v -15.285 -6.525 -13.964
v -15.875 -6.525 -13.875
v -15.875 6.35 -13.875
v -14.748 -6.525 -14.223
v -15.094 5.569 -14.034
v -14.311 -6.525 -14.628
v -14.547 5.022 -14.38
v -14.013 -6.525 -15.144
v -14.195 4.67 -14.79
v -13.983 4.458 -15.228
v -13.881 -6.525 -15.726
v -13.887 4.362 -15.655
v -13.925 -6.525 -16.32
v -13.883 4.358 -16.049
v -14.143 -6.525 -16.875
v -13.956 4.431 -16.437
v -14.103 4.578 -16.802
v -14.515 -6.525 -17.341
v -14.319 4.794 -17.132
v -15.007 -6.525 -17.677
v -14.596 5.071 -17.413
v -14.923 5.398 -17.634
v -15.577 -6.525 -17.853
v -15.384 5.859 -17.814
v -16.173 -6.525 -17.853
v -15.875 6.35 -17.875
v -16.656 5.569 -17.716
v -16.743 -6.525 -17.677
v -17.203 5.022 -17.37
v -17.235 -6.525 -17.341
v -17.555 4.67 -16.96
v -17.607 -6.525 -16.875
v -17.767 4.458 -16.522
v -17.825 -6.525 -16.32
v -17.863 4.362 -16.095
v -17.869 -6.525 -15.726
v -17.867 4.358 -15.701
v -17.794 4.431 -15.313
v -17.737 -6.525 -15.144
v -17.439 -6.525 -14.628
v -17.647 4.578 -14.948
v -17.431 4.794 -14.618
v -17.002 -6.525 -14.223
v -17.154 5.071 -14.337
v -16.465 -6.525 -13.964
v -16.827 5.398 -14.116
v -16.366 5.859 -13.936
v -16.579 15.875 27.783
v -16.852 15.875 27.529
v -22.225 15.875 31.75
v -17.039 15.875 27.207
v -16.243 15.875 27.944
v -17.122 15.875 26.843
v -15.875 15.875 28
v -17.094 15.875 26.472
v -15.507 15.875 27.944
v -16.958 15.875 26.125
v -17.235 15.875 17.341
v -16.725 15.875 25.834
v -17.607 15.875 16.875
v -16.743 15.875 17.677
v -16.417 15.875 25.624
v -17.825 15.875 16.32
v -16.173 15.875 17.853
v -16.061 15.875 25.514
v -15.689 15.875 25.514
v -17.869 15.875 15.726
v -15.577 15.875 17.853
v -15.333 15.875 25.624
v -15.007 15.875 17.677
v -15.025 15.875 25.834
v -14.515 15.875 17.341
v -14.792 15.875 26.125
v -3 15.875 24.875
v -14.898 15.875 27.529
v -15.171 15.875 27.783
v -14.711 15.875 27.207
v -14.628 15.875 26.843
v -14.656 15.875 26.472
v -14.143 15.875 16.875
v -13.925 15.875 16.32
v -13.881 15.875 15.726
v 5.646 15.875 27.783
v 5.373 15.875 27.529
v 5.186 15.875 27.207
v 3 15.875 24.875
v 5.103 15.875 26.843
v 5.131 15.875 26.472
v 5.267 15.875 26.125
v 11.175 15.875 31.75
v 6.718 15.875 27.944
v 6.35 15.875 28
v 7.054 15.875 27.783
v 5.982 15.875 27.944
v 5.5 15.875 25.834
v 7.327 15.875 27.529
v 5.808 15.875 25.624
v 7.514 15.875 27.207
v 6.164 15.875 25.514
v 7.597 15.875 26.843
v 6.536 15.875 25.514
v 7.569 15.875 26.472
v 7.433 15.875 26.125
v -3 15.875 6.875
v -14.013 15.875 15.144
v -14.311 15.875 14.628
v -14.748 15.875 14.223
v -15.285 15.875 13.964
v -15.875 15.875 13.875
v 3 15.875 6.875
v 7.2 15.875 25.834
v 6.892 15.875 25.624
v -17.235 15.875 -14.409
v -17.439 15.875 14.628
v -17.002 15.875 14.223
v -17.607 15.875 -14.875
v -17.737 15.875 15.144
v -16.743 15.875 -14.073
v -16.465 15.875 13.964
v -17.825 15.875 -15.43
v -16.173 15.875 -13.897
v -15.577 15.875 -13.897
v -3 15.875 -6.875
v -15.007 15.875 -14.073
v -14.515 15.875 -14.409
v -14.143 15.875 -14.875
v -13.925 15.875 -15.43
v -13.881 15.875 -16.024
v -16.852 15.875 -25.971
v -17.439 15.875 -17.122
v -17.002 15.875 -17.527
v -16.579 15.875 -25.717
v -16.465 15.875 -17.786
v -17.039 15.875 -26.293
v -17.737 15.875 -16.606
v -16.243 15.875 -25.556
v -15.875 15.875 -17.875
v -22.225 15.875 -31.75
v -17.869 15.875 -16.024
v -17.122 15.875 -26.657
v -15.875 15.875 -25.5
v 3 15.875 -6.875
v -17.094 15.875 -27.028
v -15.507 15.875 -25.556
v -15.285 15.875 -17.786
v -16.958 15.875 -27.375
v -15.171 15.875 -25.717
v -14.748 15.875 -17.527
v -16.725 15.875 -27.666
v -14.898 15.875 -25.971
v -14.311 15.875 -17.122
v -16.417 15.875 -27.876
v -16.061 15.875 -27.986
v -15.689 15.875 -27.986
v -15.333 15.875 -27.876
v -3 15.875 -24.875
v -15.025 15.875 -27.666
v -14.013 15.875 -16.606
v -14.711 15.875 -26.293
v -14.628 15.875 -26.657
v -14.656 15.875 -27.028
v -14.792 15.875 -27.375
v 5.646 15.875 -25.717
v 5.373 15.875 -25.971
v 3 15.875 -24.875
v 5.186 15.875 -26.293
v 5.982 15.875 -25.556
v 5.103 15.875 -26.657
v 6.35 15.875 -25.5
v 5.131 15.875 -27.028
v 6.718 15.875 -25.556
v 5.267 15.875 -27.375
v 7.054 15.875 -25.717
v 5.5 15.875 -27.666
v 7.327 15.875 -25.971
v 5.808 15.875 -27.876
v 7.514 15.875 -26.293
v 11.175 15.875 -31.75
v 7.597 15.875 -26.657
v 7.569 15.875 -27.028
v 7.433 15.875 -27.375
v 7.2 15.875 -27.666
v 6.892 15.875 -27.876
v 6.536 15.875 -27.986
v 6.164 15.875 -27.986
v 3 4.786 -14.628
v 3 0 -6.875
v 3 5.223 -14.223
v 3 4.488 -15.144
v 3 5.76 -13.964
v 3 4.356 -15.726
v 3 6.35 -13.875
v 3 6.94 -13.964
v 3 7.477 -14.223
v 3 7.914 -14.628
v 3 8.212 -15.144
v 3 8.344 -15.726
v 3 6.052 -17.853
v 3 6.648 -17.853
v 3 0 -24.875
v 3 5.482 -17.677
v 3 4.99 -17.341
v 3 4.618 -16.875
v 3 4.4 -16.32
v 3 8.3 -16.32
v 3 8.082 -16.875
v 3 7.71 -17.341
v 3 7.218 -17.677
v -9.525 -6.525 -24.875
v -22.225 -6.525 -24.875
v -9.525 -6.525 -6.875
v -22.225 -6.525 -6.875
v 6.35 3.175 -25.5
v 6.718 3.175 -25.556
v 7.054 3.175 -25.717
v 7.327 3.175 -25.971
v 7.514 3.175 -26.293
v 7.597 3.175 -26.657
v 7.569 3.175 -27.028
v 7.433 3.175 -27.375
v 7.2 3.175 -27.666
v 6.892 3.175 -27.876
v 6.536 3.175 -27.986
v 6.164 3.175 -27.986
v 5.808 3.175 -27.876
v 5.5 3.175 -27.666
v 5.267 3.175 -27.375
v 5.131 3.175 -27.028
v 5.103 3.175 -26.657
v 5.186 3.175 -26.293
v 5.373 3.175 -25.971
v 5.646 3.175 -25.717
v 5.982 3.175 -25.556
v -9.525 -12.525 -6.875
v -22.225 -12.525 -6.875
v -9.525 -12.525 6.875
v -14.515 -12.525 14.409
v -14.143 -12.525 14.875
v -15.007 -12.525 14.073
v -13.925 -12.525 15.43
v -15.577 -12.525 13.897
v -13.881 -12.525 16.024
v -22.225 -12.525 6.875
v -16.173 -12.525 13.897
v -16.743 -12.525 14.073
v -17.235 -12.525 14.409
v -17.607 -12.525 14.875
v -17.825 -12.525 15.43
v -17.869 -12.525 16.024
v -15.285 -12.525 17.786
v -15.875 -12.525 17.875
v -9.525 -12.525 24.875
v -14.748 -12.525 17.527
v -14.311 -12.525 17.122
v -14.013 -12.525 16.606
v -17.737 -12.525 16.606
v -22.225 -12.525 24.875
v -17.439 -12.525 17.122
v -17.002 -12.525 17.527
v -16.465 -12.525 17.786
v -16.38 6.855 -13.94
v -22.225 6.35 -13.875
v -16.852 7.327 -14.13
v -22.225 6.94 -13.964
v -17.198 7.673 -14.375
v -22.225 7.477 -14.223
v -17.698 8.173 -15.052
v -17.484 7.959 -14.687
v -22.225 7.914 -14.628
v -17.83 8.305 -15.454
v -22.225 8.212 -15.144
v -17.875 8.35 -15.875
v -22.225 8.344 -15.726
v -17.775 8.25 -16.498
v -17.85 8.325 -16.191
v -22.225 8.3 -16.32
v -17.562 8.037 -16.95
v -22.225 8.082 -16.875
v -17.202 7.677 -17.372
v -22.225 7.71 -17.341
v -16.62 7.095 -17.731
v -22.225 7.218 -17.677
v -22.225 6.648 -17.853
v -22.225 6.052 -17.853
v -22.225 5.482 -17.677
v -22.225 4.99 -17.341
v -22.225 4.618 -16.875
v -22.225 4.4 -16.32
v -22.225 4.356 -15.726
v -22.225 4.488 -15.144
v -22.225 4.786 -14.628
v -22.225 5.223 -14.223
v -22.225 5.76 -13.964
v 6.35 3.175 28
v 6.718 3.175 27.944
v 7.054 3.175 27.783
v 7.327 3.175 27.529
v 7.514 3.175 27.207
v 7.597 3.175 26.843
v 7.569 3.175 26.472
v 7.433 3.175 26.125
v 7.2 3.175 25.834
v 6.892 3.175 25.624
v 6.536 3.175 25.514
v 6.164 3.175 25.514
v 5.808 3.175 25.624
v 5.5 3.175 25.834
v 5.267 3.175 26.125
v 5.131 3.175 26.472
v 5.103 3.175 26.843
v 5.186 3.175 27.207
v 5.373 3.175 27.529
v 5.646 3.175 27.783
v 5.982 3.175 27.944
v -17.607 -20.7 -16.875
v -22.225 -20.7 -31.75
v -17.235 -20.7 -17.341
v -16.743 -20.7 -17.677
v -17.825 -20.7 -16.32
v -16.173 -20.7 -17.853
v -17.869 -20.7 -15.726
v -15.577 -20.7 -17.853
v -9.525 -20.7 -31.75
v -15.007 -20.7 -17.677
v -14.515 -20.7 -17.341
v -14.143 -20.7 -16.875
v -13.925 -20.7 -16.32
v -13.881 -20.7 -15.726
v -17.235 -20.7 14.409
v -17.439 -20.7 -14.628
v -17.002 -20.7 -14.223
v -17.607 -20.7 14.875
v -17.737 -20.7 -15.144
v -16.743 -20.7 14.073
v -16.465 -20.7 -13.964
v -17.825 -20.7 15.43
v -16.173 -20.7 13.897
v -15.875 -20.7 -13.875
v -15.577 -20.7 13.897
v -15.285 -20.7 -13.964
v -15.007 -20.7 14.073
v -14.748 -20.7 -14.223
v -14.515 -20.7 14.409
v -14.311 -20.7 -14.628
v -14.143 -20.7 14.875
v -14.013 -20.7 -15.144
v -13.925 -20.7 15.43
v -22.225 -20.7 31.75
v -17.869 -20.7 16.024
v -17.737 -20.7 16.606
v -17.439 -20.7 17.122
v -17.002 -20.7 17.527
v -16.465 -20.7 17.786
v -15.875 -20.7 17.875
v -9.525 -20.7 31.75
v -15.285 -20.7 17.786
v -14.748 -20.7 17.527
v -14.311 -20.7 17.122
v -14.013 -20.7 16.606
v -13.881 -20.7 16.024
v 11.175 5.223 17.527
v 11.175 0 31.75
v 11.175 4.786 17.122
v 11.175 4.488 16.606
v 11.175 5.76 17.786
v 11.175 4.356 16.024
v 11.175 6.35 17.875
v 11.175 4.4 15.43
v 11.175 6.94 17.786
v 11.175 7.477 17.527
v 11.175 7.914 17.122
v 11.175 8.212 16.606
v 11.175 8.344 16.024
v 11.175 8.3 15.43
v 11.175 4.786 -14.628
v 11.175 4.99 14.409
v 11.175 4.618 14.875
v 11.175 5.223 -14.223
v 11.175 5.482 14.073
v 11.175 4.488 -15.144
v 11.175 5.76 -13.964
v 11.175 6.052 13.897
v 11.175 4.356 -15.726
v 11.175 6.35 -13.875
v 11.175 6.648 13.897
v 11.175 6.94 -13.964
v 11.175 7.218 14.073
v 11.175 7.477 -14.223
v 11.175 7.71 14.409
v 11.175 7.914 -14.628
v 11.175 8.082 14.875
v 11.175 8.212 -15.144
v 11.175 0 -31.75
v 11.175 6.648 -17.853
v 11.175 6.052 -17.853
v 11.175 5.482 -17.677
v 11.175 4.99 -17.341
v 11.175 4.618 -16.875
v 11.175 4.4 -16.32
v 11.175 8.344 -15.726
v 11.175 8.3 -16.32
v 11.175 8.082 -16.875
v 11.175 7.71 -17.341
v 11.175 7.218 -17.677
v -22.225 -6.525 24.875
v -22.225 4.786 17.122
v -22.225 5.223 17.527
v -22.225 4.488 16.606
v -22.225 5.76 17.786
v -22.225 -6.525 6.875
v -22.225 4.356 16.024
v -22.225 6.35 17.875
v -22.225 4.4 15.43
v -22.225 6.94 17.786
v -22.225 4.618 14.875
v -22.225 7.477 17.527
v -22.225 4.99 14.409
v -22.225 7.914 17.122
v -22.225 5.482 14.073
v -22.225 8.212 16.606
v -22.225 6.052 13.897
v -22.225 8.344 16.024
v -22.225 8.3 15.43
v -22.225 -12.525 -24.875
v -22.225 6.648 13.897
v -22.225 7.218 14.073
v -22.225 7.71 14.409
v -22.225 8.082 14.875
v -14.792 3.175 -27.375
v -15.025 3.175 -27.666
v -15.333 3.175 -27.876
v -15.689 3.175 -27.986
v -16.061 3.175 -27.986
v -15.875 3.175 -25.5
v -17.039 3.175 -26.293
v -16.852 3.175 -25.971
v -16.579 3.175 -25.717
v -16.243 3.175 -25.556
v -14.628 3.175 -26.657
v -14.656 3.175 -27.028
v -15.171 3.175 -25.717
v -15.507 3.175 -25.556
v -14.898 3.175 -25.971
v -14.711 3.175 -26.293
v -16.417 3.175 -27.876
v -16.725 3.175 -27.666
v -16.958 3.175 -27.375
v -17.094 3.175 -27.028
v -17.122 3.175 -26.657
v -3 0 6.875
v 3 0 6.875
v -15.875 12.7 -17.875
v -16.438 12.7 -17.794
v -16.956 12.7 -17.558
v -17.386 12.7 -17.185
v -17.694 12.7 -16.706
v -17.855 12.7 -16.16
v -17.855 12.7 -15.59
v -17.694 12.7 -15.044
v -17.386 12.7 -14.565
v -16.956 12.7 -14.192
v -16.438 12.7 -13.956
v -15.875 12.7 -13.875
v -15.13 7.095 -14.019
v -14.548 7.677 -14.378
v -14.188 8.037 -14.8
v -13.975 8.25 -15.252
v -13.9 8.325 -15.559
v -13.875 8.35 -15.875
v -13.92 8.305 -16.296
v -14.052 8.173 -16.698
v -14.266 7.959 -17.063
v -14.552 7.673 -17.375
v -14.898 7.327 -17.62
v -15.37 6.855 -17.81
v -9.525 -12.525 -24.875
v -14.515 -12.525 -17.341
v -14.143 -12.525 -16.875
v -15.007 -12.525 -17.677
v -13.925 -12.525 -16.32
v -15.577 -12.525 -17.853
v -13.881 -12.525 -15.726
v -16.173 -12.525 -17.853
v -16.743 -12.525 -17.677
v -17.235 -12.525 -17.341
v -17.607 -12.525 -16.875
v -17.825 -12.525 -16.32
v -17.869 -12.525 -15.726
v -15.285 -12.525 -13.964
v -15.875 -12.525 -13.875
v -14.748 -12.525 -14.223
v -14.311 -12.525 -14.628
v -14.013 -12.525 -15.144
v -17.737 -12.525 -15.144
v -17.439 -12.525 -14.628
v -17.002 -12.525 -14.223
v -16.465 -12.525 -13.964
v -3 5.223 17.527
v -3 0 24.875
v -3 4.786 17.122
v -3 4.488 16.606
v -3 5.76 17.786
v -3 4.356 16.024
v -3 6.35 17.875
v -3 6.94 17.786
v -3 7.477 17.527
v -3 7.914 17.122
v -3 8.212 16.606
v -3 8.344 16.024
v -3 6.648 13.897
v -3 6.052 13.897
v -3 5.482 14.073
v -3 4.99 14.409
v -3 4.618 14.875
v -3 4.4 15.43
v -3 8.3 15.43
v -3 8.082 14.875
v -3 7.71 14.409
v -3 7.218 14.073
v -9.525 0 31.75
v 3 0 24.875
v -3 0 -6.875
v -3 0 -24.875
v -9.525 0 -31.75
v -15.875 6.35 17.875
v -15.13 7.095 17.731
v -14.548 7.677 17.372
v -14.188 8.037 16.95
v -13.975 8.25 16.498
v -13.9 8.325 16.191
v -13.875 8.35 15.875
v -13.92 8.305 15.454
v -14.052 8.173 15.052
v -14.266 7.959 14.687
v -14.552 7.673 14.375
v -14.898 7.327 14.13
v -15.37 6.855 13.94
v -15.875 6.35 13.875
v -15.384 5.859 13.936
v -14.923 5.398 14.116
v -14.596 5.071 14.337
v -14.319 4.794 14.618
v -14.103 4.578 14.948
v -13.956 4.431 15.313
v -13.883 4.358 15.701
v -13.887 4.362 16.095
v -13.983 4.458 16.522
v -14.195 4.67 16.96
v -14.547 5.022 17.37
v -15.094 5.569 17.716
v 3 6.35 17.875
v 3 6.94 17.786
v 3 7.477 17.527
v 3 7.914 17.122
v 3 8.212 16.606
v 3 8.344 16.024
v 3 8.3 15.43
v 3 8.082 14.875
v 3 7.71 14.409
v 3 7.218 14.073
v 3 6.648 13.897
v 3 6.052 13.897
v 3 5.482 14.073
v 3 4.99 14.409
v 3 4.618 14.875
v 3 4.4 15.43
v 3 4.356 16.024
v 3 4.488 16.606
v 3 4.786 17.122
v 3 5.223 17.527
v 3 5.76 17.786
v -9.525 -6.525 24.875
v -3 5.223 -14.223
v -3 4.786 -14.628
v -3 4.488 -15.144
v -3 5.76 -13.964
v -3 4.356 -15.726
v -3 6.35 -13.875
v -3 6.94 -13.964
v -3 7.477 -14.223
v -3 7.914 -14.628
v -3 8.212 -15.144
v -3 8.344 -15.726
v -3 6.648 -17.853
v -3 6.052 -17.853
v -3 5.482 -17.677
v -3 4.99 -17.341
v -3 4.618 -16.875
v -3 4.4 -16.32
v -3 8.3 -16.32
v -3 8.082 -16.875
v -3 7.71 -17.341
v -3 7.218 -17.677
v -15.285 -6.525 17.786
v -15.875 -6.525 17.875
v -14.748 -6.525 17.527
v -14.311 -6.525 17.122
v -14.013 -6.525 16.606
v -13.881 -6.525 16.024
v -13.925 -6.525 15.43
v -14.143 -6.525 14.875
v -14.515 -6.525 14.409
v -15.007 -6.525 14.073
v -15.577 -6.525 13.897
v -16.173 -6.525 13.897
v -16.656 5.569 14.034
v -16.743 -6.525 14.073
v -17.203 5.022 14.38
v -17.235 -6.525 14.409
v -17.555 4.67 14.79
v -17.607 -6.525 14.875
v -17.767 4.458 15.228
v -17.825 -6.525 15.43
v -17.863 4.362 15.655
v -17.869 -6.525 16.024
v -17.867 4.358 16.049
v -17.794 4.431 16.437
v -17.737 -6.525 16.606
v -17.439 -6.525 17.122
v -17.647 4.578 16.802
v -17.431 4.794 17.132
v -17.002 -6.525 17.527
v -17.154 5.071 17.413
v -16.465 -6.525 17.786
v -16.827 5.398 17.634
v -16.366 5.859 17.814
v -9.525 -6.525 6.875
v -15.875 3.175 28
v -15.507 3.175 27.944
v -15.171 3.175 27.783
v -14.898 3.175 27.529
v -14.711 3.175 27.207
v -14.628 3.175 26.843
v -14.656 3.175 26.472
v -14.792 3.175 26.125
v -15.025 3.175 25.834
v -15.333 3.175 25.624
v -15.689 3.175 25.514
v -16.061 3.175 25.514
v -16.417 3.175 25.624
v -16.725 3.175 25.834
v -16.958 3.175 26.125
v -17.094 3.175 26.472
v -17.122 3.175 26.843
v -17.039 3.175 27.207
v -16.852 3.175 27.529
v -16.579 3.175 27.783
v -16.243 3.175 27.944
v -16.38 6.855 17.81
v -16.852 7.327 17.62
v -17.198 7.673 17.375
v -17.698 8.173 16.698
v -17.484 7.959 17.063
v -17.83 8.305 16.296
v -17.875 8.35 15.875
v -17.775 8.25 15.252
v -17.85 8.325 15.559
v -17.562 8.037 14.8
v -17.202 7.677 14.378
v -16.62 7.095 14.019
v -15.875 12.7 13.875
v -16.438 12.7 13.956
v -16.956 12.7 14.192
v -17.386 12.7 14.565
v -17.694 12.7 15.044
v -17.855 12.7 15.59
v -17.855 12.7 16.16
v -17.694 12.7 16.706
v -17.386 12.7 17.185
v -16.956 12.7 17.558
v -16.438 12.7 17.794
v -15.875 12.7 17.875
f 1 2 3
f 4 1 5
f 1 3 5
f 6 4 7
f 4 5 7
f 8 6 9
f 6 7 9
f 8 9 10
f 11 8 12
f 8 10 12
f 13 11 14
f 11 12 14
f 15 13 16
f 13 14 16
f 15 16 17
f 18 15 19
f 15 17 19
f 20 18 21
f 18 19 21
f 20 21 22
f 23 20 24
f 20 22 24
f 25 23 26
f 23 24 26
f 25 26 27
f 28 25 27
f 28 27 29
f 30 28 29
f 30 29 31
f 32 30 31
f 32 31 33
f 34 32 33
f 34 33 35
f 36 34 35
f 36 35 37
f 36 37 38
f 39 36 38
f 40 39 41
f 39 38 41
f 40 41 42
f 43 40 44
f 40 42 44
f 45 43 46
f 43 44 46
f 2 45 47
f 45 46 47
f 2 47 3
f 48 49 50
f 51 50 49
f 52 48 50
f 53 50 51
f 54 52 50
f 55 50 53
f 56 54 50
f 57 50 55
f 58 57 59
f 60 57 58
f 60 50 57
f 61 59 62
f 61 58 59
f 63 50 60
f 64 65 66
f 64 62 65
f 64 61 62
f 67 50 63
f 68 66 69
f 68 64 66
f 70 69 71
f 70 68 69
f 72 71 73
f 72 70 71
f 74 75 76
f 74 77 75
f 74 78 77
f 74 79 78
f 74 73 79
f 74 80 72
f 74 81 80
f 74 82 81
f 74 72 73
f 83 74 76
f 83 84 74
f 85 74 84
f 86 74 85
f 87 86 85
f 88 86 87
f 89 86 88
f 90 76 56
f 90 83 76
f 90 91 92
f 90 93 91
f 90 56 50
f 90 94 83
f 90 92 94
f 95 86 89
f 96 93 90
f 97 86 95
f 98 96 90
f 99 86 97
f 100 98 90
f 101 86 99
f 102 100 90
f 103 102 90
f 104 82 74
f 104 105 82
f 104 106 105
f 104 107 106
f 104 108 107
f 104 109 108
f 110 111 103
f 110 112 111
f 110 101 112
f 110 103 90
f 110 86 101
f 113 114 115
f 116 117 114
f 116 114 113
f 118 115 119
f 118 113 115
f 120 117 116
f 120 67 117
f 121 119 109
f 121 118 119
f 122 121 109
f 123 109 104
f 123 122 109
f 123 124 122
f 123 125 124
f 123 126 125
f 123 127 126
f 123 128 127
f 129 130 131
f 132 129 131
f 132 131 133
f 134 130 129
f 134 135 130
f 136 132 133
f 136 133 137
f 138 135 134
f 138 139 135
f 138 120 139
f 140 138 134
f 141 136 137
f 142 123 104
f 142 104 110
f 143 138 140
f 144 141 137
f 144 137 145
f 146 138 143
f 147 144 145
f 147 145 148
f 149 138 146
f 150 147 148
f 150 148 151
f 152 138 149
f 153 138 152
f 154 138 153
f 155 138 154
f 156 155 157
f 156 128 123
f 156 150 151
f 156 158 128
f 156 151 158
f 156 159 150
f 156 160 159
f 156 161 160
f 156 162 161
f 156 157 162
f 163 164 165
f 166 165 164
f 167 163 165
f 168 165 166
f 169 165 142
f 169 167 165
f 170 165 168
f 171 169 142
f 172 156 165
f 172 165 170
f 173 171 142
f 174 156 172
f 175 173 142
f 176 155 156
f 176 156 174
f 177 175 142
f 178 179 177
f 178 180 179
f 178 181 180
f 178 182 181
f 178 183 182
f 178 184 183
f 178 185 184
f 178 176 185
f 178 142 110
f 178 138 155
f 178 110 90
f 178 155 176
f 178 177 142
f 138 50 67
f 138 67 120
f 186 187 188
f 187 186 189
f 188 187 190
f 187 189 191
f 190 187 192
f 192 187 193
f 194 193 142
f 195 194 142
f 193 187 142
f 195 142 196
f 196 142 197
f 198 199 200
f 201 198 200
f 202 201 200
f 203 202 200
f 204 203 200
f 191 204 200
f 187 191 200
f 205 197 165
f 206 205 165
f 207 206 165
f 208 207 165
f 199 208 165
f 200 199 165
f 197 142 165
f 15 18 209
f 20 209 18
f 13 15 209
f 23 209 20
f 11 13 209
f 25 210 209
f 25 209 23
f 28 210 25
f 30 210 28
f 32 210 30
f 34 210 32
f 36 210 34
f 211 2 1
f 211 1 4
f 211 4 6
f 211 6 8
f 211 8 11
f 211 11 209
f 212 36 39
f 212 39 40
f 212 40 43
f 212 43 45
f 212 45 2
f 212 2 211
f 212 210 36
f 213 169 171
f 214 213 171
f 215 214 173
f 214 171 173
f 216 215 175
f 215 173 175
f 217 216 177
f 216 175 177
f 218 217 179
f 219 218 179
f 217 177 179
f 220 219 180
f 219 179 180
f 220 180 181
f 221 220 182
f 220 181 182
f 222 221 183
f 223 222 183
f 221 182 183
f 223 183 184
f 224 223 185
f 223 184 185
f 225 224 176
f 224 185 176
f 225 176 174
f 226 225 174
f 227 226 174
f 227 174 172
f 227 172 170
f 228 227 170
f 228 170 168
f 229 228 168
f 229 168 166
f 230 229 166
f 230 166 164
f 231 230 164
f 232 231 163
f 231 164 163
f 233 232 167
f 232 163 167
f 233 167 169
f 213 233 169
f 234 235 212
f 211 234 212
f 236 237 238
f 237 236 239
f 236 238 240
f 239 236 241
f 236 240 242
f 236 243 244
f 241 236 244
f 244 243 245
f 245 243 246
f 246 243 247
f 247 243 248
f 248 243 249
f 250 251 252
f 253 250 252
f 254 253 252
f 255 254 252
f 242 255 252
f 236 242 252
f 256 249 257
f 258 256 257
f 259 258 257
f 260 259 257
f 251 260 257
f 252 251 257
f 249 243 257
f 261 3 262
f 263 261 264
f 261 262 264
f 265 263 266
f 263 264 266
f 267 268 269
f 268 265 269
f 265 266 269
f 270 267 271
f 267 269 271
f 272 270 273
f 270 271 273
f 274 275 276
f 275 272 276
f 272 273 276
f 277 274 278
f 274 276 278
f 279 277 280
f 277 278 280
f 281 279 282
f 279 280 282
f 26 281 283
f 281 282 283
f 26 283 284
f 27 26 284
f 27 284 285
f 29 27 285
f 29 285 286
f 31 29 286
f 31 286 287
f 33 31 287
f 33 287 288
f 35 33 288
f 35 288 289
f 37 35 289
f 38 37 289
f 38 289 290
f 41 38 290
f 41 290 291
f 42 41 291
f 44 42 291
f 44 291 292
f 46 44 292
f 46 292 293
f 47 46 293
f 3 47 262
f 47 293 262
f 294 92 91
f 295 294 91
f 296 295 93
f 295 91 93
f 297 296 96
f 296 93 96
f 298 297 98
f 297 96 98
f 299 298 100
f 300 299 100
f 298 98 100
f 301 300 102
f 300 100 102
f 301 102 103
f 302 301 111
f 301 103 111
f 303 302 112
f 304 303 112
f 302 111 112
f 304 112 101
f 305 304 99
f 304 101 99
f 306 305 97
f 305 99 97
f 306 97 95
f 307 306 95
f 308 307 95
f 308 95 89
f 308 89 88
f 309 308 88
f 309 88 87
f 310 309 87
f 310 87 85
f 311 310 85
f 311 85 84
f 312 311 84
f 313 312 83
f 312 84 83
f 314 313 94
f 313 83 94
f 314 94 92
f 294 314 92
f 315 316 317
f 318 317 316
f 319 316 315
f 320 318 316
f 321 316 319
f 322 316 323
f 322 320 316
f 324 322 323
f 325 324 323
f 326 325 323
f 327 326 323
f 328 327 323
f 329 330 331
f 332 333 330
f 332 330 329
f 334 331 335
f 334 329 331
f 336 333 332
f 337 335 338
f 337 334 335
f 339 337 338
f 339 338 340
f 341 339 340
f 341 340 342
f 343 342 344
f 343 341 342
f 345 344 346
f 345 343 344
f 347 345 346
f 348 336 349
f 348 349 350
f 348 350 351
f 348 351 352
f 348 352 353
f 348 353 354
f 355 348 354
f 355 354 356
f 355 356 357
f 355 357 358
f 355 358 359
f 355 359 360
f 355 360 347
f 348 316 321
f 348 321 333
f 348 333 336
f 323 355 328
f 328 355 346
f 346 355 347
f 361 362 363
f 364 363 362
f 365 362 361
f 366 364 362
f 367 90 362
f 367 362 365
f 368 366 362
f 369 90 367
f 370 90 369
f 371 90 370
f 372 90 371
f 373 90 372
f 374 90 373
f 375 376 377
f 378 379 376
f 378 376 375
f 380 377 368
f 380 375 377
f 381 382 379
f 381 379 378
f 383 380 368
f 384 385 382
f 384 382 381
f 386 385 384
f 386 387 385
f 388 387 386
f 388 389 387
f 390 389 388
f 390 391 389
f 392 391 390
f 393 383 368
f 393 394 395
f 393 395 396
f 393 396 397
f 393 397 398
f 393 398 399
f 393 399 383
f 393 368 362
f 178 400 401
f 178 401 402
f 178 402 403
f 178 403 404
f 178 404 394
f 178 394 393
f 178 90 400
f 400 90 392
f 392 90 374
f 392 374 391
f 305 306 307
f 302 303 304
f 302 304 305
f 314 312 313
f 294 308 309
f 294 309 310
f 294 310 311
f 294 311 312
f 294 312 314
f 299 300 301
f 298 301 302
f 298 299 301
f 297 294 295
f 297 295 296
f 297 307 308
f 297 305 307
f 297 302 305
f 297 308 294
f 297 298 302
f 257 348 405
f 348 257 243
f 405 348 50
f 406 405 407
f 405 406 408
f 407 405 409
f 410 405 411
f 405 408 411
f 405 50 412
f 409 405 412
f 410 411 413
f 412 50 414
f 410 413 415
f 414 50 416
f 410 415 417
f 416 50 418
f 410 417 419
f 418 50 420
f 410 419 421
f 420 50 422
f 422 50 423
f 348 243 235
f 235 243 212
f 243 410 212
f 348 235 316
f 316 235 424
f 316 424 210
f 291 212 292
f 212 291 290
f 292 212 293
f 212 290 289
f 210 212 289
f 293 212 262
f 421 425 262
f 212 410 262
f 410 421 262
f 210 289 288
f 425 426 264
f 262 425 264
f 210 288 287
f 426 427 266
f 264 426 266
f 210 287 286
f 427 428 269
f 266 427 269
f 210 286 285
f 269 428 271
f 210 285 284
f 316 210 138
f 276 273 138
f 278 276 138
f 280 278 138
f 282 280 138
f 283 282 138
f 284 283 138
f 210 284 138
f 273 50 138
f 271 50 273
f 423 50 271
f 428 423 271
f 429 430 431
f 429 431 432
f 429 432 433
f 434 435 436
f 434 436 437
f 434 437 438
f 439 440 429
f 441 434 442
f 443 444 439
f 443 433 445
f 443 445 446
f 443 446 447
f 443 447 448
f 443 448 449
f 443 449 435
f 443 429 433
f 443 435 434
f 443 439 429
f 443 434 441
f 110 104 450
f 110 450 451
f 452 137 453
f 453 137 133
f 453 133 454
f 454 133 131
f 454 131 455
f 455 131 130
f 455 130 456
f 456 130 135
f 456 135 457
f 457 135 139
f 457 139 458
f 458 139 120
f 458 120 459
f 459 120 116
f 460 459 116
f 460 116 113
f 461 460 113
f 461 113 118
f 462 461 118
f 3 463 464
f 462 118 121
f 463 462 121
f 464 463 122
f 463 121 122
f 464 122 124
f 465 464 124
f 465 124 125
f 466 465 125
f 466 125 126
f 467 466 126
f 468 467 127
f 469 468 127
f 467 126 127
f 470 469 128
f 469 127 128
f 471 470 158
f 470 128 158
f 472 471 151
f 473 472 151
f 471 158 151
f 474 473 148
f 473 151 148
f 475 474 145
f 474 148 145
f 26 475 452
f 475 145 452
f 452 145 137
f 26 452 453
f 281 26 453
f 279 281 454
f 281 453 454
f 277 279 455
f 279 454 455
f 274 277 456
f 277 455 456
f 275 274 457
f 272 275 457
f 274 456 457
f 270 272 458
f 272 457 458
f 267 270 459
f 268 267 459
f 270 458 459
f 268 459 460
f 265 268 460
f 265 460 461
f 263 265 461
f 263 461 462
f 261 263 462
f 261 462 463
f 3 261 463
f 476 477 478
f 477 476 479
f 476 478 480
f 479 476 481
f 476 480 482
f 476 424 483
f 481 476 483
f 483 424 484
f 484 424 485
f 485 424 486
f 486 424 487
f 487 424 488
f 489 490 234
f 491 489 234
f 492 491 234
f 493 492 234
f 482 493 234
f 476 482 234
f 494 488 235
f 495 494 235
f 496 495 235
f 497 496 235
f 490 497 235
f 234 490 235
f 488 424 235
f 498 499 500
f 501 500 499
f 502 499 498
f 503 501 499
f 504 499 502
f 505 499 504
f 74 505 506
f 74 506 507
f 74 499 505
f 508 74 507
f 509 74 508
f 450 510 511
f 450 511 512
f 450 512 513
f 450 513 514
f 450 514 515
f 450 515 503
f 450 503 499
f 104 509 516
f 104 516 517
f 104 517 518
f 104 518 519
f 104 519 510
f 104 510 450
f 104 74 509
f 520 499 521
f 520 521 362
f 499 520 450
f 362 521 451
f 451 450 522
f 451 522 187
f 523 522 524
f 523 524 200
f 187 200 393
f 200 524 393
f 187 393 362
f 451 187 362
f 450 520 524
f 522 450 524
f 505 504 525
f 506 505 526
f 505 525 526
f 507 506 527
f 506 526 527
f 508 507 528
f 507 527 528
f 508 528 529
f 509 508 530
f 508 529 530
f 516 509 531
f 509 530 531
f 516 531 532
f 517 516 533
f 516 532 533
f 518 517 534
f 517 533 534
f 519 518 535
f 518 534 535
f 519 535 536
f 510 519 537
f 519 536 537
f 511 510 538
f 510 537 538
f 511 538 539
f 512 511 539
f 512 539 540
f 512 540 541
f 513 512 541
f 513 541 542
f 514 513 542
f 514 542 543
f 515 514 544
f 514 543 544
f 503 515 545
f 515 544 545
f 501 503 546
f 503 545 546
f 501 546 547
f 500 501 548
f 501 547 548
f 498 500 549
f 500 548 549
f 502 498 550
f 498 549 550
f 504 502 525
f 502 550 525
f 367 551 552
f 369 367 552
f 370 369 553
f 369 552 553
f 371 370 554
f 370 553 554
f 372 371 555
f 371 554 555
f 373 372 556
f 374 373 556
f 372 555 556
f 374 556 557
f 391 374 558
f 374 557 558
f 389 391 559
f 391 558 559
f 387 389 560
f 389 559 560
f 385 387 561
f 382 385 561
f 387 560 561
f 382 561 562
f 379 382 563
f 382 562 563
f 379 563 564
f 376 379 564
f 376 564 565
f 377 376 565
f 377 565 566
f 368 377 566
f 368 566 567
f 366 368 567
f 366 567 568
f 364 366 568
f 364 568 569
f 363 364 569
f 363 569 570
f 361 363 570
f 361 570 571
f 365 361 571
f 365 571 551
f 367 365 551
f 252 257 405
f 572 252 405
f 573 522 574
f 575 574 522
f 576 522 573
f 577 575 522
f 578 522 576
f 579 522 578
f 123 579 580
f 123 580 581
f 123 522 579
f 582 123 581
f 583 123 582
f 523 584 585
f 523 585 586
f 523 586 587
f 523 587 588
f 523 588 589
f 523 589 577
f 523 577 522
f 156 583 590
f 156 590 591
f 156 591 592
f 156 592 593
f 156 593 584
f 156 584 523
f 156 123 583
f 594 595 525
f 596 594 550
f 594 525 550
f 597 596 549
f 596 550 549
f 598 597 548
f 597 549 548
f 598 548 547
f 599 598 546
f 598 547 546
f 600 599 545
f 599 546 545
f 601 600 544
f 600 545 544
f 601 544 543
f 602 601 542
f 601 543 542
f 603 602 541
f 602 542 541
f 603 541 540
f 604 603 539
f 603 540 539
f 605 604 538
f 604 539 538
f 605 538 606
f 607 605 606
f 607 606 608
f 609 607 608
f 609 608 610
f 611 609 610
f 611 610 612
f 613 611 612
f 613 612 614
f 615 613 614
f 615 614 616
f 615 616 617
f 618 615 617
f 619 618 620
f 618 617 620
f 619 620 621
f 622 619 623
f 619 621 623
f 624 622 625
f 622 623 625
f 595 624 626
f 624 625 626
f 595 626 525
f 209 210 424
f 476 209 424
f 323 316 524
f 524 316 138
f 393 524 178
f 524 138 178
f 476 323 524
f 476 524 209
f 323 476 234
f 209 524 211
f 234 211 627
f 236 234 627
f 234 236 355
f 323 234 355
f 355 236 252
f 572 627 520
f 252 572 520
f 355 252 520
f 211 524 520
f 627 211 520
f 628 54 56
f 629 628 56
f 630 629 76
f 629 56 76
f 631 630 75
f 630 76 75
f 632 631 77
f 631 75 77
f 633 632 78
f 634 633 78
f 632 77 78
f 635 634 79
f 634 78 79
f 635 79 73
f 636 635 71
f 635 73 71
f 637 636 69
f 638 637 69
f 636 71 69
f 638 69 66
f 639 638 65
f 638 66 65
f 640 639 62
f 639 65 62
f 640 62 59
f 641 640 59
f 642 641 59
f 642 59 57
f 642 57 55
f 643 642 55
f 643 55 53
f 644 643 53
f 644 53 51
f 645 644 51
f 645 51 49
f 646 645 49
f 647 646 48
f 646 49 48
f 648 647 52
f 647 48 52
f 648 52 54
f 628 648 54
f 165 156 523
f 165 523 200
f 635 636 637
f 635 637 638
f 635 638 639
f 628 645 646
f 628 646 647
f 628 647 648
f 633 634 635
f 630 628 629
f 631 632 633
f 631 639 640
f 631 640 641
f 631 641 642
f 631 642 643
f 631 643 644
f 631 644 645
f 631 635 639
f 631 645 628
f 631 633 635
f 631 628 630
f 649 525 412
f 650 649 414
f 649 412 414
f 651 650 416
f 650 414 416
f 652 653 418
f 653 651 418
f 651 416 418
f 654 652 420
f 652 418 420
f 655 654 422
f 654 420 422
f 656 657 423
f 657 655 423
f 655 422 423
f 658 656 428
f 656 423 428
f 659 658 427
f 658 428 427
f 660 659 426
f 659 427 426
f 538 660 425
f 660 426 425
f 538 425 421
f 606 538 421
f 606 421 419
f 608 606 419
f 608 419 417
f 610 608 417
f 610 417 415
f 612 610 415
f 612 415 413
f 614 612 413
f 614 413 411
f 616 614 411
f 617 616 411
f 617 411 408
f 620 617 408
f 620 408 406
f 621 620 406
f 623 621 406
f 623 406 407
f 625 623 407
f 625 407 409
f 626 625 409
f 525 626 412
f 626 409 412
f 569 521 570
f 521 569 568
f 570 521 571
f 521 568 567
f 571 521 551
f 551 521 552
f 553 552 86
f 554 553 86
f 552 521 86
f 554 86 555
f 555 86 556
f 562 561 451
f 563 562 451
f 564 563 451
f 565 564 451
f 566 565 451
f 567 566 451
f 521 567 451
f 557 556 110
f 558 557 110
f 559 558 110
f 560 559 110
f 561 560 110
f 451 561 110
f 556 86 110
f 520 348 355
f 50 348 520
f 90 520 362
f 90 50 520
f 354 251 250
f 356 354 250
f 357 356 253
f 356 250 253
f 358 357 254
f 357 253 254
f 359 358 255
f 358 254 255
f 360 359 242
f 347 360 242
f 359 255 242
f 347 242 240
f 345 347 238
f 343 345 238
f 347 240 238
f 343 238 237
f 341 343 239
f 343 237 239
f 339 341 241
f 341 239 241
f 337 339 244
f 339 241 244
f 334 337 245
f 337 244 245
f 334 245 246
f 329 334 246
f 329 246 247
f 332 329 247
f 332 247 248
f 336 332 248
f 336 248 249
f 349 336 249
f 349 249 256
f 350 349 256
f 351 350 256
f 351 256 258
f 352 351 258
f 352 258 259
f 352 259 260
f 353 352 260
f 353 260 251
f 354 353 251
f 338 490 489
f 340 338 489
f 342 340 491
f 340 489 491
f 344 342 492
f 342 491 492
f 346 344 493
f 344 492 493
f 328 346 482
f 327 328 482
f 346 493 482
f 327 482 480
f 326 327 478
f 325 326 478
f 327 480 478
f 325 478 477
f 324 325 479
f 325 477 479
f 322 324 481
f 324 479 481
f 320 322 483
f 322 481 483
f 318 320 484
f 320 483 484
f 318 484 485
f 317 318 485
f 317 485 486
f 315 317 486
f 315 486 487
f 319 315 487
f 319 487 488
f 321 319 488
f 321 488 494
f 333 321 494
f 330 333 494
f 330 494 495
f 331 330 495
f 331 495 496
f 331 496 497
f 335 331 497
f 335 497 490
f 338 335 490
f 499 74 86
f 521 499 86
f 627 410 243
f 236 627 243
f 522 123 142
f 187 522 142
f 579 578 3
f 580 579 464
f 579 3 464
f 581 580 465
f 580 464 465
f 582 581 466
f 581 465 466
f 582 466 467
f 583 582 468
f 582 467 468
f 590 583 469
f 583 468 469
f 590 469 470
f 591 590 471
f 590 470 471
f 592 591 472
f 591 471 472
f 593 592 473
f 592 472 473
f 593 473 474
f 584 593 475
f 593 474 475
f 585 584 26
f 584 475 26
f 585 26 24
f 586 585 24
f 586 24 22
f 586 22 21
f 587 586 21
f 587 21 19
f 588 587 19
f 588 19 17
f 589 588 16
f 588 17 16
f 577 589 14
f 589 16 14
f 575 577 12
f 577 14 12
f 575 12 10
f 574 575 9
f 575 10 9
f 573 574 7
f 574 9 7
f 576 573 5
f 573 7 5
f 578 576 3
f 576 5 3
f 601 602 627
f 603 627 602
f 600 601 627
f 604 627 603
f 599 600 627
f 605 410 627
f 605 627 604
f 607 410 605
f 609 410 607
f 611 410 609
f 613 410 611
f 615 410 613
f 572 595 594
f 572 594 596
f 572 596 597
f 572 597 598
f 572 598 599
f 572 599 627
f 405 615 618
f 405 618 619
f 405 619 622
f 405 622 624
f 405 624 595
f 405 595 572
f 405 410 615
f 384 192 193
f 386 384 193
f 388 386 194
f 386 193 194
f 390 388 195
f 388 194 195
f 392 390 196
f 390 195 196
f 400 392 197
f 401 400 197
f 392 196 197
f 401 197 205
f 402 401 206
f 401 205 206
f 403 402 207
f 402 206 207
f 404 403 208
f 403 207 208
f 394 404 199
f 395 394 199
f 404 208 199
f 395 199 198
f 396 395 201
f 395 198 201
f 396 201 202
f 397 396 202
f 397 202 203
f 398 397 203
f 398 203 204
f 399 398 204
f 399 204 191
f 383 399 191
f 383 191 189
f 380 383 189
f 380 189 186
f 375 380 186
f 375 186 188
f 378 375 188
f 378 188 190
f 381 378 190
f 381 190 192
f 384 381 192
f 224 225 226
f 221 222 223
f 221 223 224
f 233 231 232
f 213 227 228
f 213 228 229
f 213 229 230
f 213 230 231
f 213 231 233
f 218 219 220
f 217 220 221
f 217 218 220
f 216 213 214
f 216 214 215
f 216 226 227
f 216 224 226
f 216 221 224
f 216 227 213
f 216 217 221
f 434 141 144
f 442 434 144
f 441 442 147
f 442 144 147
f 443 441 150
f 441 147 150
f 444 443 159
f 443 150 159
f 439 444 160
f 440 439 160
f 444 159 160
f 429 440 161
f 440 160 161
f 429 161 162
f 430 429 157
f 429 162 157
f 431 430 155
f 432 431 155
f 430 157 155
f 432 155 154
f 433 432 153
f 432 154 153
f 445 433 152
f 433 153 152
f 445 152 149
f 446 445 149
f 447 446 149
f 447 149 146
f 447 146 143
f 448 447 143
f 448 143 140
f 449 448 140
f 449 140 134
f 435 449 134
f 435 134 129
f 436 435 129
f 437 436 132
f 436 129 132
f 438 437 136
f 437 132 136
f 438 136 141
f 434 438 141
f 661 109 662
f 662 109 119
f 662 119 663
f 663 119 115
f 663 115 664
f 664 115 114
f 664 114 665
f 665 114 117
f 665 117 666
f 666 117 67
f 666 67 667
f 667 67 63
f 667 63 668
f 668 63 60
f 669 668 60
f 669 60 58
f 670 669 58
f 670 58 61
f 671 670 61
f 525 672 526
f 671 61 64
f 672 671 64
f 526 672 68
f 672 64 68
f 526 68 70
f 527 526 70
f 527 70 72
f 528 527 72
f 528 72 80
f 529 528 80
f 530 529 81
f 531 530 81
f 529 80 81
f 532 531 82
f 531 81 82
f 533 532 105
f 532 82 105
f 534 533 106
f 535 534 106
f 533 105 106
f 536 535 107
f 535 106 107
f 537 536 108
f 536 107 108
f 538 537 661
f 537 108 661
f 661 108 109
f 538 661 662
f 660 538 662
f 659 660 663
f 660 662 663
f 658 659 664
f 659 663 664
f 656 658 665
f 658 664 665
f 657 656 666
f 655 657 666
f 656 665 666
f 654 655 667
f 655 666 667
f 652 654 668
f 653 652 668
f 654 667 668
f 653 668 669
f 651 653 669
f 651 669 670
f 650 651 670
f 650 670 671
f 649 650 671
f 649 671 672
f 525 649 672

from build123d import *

# Parameters (mm, degrees)
BOSS_EXTRUDE1_DEPTH = 12.7
SKETCH2_W           = 12.7
SKETCH2_H           = 63.5
BOSS_EXTRUDE2_DEPTH = 31.75
SKETCH3_W           = 18
SKETCH3_H           = 3
CUT_EXTRUDE1_DEPTH  = 19.05
SKETCH4_R           = 2
CUT_EXTRUDE2_DEPTH  = 59.973007597
SKETCH5_R           = 2
CUT_EXTRUDE3_DEPTH  = 64.181702256
SKETCH6_W           = 63.5
SKETCH6_H           = 12.7
CUT_EXTRUDE4_DEPTH  = 11.05
SKETCH7_W           = 12.7
SKETCH7_H           = 63.5
CUT_EXTRUDE5_DEPTH  = 11.05
BOSS_EXTRUDE3_START = 3.175
SKETCH8_W           = 33.4
SKETCH8_H           = 63.5
SKETCH8_R           = 2
SKETCH8_W_2         = 6
SKETCH8_H_2         = 18
BOSS_EXTRUDE3_DEPTH = 3.175
SKETCH9_R           = 1.25
CUT_EXTRUDE6_DEPTH  = 12.7


with BuildPart() as part:
    # Sketch1 → Boss-Extrude1 (new body)
    with BuildSketch(Plane(origin=(0, 0, 0), x_dir=(1, 0, 0), z_dir=(0, 1, 0))):
        Polygon((-22.225, 31.75), (-22.225, -31.75), (0, -31.75), (0, -24.875), (-3, -24.875), (-3, -6.875), (0, -6.875), (0, 0), (0, 6.875), (-3, 6.875), (-3, 24.875), (0, 24.875), (0, 31.75), align=None)
        Polygon((0, -24.875), (0, -31.75), (22.225, -31.75), (22.225, 31.75), (0, 31.75), (0, 24.875), (3, 24.875), (3, 6.875), (0, 6.875), (0, 0), (0, -6.875), (3, -6.875), (3, -24.875), align=None)
    extrude(amount=BOSS_EXTRUDE1_DEPTH)

    # Sketch2 → Boss-Extrude2 (add)
    with BuildSketch(Plane.XZ):
        with Locations((-15.875, 0)):
            Rectangle(SKETCH2_W, SKETCH2_H)
    extrude(amount=BOSS_EXTRUDE2_DEPTH)

    # Sketch3 → Cut-Extrude1 (cut)
    with BuildSketch(Plane.ZY.offset(22.225)):
        with Locations((-15.875, -8.025)):
            Rectangle(SKETCH3_W, SKETCH3_H)
        with Locations((-15.875, -11.025)):
            Rectangle(SKETCH3_W, SKETCH3_H)
        with Locations((15.875, -8.025)):
            Rectangle(SKETCH3_W, SKETCH3_H)
        with Locations((15.875, -11.025)):
            Rectangle(SKETCH3_W, SKETCH3_H)
    extrude(amount=-CUT_EXTRUDE1_DEPTH, mode=Mode.SUBTRACT)

    # Sketch4 → Cut-Extrude2 (cut, through all)
    with BuildSketch(Plane(origin=(0, 12.7, 0), x_dir=(1, 0, 0), z_dir=(0, 1, 0))):
        with Locations(Location((-15.875, 15.875, 0), (0, 0, 270))):
            Circle(SKETCH4_R)
        with Locations(Location((-15.875, -15.875, 0), (0, 0, 270))):
            Circle(SKETCH4_R)
    extrude(amount=-CUT_EXTRUDE2_DEPTH, mode=Mode.SUBTRACT)

    # Sketch5 → Cut-Extrude3 (cut, through all)
    with BuildSketch(Plane.ZY.offset(22.225)):
        with Locations((-15.875, 6.35)):
            Circle(SKETCH5_R)
        with Locations((15.875, 6.35)):
            Circle(SKETCH5_R)
    extrude(amount=-CUT_EXTRUDE3_DEPTH, mode=Mode.SUBTRACT)

    # Sketch6 → Cut-Extrude4 (cut)
    with BuildSketch(Plane(origin=(22.225, 0, 0), x_dir=(0, 0, -1), z_dir=(1, 0, 0))):
        with Locations((0, 6.35)):
            Rectangle(SKETCH6_W, SKETCH6_H)
    extrude(amount=-CUT_EXTRUDE4_DEPTH, mode=Mode.SUBTRACT)

    # Sketch7 → Cut-Extrude5 (cut)
    with BuildSketch(Plane.XZ.offset(31.75)):
        with Locations((-15.875, 0)):
            Rectangle(SKETCH7_W, SKETCH7_H)
    extrude(amount=-CUT_EXTRUDE5_DEPTH, mode=Mode.SUBTRACT)

    # Sketch8 → Boss-Extrude3 (add)
    with BuildSketch(Plane(origin=(0, 12.7, 0), x_dir=(1, 0, 0), z_dir=(0, 1, 0)).offset(BOSS_EXTRUDE3_START)):
        with Locations((-5.525, 0)):
            Rectangle(SKETCH8_W, SKETCH8_H)
        with Locations(Location((-15.875, 15.875, 0), (0, 0, 90))):
            Circle(SKETCH8_R, mode=Mode.SUBTRACT)
        with Locations(Location((-15.875, -15.875, 0), (0, 0, 90))):
            Circle(SKETCH8_R, mode=Mode.SUBTRACT)
        with Locations((0, -15.875)):
            Rectangle(SKETCH8_W_2, SKETCH8_H_2, mode=Mode.SUBTRACT)
        with Locations((0, 15.875)):
            Rectangle(SKETCH8_W_2, SKETCH8_H_2, mode=Mode.SUBTRACT)
    extrude(amount=-BOSS_EXTRUDE3_DEPTH)

    # Sketch9 → Cut-Extrude6 (cut)
    with BuildSketch(Plane(origin=(0, 15.875, 0), x_dir=(1, 0, 0), z_dir=(0, 1, 0))):
        with Locations(Location((-15.875, 26.75, 0), (0, 0, 270))):
            Circle(SKETCH9_R)
        with Locations(Location((-15.875, -26.75, 0), (0, 0, 270))):
            Circle(SKETCH9_R)
        with Locations(Location((6.35, 26.75, 0), (0, 0, 270))):
            Circle(SKETCH9_R)
        with Locations(Location((6.35, -26.75, 0), (0, 0, 270))):
            Circle(SKETCH9_R)
    extrude(amount=-CUT_EXTRUDE6_DEPTH, mode=Mode.SUBTRACT)


solid = part.part
